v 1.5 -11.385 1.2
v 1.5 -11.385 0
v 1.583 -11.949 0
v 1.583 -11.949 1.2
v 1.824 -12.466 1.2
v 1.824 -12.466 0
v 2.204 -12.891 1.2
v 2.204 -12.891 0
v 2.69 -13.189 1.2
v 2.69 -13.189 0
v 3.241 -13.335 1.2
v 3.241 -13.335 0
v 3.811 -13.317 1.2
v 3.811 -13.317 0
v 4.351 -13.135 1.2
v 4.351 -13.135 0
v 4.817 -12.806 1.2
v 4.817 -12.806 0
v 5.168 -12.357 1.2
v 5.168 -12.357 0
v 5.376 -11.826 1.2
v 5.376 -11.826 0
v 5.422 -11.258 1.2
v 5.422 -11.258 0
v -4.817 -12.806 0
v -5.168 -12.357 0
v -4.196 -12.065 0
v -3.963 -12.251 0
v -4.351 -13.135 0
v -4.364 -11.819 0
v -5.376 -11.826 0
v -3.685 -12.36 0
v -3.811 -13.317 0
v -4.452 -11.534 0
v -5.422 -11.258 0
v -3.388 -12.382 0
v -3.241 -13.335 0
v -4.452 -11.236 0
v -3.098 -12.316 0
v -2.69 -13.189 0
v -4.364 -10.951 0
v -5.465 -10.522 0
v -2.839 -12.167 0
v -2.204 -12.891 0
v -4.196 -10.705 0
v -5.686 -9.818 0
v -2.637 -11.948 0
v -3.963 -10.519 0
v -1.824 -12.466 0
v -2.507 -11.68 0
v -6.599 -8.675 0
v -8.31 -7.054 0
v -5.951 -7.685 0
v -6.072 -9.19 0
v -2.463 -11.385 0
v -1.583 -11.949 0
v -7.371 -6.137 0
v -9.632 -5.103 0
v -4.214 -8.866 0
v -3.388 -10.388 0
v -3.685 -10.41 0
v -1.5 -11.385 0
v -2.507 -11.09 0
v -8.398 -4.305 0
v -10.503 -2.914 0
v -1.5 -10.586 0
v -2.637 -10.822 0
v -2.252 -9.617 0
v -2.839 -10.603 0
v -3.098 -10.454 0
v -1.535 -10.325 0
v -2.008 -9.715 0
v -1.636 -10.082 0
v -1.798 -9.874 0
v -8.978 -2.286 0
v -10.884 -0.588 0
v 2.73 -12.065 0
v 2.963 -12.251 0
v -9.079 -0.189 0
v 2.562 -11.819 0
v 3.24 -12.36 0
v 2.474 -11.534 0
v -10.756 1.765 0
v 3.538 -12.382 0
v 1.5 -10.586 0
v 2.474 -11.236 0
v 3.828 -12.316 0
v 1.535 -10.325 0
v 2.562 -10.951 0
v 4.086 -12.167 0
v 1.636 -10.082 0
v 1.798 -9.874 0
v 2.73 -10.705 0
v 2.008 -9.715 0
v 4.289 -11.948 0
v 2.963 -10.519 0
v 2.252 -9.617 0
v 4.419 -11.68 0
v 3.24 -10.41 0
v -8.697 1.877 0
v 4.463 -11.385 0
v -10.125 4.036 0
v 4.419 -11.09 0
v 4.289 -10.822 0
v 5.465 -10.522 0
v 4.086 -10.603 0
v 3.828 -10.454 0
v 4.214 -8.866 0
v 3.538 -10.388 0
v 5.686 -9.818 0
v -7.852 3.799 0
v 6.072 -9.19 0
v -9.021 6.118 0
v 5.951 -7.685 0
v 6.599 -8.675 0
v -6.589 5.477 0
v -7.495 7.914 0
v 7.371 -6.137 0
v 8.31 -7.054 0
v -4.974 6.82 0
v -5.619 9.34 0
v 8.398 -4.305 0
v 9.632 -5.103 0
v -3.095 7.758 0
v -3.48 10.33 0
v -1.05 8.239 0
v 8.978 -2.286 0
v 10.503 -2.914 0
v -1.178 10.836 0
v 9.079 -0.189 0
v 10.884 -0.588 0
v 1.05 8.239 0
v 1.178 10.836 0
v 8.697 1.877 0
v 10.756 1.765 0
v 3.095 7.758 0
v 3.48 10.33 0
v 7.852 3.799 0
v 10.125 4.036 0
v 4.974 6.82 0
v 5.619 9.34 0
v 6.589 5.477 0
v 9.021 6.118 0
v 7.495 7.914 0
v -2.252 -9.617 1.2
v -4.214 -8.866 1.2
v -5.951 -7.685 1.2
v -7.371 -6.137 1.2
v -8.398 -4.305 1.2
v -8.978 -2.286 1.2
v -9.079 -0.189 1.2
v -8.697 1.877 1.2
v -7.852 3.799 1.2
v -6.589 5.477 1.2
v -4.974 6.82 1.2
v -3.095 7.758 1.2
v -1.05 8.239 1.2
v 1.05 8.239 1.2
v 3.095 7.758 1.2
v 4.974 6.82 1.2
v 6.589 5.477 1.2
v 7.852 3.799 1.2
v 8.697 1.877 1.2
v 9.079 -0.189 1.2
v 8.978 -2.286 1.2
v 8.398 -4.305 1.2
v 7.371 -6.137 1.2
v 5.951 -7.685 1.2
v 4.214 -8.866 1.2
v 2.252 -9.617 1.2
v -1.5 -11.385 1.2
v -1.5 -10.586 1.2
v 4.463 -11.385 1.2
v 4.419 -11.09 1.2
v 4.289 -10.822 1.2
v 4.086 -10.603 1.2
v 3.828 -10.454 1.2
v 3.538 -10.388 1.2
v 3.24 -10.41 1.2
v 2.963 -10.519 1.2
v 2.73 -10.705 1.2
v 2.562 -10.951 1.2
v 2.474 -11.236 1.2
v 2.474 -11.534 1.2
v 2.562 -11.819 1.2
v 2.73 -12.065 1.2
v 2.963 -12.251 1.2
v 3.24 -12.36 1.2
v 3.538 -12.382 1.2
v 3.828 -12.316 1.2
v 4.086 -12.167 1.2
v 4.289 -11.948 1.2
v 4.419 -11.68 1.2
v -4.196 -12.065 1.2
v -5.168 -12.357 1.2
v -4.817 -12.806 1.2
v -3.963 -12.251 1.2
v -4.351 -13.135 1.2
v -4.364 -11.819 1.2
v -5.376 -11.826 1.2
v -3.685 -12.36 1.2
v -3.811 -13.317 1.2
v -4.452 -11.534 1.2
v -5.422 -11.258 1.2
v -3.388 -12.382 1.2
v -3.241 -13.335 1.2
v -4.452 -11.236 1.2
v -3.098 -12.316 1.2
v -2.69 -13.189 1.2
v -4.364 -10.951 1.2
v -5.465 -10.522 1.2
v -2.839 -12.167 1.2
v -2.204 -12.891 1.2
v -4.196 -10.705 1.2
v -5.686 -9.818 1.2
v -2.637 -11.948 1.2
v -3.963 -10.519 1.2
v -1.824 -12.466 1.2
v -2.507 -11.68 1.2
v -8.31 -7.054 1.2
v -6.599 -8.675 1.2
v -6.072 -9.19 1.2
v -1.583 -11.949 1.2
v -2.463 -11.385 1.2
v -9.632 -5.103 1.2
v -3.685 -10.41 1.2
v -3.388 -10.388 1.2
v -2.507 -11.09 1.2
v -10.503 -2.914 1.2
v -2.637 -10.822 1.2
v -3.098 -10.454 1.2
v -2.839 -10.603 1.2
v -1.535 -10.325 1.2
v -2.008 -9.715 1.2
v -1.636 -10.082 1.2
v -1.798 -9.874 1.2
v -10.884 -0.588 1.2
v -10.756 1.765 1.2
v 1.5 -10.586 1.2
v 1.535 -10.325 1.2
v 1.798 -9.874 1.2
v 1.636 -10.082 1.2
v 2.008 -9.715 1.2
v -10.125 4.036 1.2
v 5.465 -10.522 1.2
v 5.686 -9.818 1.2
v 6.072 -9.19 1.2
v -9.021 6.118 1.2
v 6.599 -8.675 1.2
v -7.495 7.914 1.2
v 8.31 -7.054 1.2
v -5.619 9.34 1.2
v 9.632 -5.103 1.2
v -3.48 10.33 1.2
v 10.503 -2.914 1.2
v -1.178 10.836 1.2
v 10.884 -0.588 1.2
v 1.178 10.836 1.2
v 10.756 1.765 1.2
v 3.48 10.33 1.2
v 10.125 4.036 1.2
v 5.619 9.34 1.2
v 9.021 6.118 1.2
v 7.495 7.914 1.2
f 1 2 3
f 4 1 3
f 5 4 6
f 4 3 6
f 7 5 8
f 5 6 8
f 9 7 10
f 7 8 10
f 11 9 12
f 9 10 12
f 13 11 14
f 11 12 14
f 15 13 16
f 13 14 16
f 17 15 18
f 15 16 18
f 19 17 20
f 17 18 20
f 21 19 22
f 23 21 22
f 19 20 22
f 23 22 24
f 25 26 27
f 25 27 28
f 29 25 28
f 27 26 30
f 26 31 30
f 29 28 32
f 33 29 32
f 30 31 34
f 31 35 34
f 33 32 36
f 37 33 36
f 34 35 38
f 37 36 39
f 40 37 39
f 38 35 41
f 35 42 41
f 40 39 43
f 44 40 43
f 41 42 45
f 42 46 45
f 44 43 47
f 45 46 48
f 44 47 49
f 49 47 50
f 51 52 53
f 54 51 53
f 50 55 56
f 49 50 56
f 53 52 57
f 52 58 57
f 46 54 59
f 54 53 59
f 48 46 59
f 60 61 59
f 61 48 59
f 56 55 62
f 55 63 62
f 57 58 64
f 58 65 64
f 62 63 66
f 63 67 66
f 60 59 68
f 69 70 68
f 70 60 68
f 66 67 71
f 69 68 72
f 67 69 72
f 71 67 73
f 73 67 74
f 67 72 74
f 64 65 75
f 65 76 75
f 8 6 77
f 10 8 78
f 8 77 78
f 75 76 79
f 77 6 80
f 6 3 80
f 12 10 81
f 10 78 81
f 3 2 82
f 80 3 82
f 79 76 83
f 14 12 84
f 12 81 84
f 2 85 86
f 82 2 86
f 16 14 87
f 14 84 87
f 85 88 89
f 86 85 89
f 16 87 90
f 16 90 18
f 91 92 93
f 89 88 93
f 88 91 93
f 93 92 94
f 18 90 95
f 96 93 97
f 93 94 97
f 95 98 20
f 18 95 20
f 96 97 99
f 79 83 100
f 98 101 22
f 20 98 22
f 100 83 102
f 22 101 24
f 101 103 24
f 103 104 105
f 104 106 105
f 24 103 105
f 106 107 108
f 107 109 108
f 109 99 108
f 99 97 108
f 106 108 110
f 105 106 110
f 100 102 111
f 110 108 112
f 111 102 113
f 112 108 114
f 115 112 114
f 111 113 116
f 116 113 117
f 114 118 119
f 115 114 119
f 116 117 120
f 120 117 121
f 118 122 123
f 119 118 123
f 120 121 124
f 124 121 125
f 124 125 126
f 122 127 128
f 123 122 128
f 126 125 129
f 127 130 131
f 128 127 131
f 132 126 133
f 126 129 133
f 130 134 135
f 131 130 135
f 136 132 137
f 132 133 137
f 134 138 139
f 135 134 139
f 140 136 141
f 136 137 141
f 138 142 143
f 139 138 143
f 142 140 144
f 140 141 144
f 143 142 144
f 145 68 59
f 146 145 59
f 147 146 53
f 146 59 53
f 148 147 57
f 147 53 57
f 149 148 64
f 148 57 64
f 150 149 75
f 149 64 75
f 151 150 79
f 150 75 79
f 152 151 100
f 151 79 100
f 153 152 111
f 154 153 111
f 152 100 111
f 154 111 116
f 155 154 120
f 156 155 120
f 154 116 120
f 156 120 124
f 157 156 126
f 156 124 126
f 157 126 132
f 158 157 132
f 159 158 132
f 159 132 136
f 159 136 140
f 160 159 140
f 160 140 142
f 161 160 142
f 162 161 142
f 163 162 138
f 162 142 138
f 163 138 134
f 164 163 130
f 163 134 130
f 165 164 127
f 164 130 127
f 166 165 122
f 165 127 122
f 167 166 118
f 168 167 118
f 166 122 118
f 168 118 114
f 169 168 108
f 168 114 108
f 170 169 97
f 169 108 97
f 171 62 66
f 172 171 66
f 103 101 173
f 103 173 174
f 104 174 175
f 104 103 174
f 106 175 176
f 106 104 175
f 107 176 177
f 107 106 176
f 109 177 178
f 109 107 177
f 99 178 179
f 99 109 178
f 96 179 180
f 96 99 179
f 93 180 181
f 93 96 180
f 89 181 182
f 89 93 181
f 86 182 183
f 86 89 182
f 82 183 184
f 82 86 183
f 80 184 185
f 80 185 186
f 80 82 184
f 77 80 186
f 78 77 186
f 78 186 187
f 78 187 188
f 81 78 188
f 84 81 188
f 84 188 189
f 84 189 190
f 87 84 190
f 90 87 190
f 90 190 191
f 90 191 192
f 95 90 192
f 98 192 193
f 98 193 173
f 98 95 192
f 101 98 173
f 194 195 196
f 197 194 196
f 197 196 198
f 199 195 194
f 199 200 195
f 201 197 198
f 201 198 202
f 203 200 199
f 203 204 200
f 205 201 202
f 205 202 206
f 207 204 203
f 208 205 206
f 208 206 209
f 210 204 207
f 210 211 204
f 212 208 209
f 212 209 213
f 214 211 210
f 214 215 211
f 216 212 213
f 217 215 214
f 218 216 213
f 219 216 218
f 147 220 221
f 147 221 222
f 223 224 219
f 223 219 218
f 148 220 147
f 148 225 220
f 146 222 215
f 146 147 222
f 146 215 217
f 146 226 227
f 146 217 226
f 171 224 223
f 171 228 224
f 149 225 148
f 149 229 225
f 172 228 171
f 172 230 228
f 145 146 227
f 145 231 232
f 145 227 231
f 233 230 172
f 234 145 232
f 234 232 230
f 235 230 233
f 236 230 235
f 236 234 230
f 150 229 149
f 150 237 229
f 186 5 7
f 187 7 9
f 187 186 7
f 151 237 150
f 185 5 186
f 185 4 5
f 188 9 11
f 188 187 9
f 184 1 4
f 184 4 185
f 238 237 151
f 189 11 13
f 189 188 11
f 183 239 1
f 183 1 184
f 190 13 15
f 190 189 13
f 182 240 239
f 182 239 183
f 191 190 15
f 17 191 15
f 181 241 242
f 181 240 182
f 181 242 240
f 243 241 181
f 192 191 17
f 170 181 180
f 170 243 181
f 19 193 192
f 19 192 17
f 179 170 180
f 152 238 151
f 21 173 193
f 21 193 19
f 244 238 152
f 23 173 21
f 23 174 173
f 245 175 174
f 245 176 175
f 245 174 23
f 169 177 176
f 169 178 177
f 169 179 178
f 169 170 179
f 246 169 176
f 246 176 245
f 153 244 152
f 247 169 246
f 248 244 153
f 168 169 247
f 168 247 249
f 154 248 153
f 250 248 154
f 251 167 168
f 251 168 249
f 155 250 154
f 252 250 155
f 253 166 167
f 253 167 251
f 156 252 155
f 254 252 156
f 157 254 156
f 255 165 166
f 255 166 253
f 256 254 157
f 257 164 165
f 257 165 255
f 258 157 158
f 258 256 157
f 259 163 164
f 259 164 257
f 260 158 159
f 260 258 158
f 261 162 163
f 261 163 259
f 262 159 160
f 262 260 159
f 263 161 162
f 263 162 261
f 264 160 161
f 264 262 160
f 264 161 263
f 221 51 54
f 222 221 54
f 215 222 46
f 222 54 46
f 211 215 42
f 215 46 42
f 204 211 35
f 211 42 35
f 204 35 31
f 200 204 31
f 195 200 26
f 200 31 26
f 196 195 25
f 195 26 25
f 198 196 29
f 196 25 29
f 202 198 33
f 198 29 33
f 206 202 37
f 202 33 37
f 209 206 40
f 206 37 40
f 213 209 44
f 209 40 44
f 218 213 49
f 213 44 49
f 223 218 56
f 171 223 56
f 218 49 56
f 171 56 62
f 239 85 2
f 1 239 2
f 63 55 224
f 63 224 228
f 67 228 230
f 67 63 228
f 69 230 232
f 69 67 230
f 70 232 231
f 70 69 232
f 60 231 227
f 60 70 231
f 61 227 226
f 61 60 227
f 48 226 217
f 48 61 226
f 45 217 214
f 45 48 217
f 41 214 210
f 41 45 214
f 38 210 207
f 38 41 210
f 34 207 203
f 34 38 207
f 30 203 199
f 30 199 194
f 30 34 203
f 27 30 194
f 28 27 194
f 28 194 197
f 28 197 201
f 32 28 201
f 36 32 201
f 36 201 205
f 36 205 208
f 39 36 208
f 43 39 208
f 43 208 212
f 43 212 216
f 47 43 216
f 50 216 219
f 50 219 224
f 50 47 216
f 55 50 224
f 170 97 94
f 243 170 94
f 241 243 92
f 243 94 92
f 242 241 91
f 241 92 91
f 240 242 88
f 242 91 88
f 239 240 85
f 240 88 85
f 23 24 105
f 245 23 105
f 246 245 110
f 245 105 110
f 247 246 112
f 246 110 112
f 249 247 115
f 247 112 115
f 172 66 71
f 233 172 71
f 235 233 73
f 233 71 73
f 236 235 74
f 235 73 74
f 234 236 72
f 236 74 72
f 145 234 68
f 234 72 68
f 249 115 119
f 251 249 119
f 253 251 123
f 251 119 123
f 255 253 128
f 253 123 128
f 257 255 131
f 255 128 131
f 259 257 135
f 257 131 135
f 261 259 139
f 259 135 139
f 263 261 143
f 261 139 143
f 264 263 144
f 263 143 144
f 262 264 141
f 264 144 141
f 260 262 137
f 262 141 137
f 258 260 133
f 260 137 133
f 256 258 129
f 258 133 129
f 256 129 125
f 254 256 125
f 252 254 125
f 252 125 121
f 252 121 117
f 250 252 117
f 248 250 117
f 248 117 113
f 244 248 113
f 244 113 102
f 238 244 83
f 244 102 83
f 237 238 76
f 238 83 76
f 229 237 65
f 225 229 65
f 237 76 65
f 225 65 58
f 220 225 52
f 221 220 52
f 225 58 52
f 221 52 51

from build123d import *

# Parameters (mm, degrees)
SKETCH_1_R      = 1
EXTRUDE_1_DEPTH = 1.2


with BuildPart() as part:
    # Эскиз1 → Бобышка-Вытянуть1 (new body)
    with BuildSketch(Plane.XY):
        with BuildLine():
            Line((-1.5, -11.384990922), (-1.5, -10.585703858))
            ThreePointArc((-1.5, -10.585703858), (-1.710213715, -9.972321739), (-2.252475248, -9.616822288))
            ThreePointArc((-2.252475248, -9.616822288), (0, 8.3), (2.252475248, -9.616822288))
            ThreePointArc((2.252475248, -9.616822288), (1.710213715, -9.972321739), (1.5, -10.585703858))
            Line((1.5, -10.585703858), (1.5, -11.384990922))
            ThreePointArc((1.5, -11.384990922), (3.52665001, -13.346900966), (5.421753104, -11.257646183))
            ThreePointArc((5.421753104, -11.257646183), (5.685775429, -9.818447988), (6.599152829, -8.675320279))
            ThreePointArc((6.599152829, -8.675320279), (0, 10.9), (-6.599152829, -8.675320279))
            ThreePointArc((-6.599152829, -8.675320279), (-5.685775429, -9.818447988), (-5.421753104, -11.257646183))
            ThreePointArc((-5.421753104, -11.257646183), (-3.52665001, -13.346900966), (-1.5, -11.384990922))
        make_face()
        with Locations((-3.462944082, -11.384990922)):
            Circle(SKETCH_1_R, mode=Mode.SUBTRACT)
        with Locations((3.462944082, -11.384990922)):
            Circle(SKETCH_1_R, mode=Mode.SUBTRACT)
    extrude(amount=EXTRUDE_1_DEPTH)


solid = part.part
